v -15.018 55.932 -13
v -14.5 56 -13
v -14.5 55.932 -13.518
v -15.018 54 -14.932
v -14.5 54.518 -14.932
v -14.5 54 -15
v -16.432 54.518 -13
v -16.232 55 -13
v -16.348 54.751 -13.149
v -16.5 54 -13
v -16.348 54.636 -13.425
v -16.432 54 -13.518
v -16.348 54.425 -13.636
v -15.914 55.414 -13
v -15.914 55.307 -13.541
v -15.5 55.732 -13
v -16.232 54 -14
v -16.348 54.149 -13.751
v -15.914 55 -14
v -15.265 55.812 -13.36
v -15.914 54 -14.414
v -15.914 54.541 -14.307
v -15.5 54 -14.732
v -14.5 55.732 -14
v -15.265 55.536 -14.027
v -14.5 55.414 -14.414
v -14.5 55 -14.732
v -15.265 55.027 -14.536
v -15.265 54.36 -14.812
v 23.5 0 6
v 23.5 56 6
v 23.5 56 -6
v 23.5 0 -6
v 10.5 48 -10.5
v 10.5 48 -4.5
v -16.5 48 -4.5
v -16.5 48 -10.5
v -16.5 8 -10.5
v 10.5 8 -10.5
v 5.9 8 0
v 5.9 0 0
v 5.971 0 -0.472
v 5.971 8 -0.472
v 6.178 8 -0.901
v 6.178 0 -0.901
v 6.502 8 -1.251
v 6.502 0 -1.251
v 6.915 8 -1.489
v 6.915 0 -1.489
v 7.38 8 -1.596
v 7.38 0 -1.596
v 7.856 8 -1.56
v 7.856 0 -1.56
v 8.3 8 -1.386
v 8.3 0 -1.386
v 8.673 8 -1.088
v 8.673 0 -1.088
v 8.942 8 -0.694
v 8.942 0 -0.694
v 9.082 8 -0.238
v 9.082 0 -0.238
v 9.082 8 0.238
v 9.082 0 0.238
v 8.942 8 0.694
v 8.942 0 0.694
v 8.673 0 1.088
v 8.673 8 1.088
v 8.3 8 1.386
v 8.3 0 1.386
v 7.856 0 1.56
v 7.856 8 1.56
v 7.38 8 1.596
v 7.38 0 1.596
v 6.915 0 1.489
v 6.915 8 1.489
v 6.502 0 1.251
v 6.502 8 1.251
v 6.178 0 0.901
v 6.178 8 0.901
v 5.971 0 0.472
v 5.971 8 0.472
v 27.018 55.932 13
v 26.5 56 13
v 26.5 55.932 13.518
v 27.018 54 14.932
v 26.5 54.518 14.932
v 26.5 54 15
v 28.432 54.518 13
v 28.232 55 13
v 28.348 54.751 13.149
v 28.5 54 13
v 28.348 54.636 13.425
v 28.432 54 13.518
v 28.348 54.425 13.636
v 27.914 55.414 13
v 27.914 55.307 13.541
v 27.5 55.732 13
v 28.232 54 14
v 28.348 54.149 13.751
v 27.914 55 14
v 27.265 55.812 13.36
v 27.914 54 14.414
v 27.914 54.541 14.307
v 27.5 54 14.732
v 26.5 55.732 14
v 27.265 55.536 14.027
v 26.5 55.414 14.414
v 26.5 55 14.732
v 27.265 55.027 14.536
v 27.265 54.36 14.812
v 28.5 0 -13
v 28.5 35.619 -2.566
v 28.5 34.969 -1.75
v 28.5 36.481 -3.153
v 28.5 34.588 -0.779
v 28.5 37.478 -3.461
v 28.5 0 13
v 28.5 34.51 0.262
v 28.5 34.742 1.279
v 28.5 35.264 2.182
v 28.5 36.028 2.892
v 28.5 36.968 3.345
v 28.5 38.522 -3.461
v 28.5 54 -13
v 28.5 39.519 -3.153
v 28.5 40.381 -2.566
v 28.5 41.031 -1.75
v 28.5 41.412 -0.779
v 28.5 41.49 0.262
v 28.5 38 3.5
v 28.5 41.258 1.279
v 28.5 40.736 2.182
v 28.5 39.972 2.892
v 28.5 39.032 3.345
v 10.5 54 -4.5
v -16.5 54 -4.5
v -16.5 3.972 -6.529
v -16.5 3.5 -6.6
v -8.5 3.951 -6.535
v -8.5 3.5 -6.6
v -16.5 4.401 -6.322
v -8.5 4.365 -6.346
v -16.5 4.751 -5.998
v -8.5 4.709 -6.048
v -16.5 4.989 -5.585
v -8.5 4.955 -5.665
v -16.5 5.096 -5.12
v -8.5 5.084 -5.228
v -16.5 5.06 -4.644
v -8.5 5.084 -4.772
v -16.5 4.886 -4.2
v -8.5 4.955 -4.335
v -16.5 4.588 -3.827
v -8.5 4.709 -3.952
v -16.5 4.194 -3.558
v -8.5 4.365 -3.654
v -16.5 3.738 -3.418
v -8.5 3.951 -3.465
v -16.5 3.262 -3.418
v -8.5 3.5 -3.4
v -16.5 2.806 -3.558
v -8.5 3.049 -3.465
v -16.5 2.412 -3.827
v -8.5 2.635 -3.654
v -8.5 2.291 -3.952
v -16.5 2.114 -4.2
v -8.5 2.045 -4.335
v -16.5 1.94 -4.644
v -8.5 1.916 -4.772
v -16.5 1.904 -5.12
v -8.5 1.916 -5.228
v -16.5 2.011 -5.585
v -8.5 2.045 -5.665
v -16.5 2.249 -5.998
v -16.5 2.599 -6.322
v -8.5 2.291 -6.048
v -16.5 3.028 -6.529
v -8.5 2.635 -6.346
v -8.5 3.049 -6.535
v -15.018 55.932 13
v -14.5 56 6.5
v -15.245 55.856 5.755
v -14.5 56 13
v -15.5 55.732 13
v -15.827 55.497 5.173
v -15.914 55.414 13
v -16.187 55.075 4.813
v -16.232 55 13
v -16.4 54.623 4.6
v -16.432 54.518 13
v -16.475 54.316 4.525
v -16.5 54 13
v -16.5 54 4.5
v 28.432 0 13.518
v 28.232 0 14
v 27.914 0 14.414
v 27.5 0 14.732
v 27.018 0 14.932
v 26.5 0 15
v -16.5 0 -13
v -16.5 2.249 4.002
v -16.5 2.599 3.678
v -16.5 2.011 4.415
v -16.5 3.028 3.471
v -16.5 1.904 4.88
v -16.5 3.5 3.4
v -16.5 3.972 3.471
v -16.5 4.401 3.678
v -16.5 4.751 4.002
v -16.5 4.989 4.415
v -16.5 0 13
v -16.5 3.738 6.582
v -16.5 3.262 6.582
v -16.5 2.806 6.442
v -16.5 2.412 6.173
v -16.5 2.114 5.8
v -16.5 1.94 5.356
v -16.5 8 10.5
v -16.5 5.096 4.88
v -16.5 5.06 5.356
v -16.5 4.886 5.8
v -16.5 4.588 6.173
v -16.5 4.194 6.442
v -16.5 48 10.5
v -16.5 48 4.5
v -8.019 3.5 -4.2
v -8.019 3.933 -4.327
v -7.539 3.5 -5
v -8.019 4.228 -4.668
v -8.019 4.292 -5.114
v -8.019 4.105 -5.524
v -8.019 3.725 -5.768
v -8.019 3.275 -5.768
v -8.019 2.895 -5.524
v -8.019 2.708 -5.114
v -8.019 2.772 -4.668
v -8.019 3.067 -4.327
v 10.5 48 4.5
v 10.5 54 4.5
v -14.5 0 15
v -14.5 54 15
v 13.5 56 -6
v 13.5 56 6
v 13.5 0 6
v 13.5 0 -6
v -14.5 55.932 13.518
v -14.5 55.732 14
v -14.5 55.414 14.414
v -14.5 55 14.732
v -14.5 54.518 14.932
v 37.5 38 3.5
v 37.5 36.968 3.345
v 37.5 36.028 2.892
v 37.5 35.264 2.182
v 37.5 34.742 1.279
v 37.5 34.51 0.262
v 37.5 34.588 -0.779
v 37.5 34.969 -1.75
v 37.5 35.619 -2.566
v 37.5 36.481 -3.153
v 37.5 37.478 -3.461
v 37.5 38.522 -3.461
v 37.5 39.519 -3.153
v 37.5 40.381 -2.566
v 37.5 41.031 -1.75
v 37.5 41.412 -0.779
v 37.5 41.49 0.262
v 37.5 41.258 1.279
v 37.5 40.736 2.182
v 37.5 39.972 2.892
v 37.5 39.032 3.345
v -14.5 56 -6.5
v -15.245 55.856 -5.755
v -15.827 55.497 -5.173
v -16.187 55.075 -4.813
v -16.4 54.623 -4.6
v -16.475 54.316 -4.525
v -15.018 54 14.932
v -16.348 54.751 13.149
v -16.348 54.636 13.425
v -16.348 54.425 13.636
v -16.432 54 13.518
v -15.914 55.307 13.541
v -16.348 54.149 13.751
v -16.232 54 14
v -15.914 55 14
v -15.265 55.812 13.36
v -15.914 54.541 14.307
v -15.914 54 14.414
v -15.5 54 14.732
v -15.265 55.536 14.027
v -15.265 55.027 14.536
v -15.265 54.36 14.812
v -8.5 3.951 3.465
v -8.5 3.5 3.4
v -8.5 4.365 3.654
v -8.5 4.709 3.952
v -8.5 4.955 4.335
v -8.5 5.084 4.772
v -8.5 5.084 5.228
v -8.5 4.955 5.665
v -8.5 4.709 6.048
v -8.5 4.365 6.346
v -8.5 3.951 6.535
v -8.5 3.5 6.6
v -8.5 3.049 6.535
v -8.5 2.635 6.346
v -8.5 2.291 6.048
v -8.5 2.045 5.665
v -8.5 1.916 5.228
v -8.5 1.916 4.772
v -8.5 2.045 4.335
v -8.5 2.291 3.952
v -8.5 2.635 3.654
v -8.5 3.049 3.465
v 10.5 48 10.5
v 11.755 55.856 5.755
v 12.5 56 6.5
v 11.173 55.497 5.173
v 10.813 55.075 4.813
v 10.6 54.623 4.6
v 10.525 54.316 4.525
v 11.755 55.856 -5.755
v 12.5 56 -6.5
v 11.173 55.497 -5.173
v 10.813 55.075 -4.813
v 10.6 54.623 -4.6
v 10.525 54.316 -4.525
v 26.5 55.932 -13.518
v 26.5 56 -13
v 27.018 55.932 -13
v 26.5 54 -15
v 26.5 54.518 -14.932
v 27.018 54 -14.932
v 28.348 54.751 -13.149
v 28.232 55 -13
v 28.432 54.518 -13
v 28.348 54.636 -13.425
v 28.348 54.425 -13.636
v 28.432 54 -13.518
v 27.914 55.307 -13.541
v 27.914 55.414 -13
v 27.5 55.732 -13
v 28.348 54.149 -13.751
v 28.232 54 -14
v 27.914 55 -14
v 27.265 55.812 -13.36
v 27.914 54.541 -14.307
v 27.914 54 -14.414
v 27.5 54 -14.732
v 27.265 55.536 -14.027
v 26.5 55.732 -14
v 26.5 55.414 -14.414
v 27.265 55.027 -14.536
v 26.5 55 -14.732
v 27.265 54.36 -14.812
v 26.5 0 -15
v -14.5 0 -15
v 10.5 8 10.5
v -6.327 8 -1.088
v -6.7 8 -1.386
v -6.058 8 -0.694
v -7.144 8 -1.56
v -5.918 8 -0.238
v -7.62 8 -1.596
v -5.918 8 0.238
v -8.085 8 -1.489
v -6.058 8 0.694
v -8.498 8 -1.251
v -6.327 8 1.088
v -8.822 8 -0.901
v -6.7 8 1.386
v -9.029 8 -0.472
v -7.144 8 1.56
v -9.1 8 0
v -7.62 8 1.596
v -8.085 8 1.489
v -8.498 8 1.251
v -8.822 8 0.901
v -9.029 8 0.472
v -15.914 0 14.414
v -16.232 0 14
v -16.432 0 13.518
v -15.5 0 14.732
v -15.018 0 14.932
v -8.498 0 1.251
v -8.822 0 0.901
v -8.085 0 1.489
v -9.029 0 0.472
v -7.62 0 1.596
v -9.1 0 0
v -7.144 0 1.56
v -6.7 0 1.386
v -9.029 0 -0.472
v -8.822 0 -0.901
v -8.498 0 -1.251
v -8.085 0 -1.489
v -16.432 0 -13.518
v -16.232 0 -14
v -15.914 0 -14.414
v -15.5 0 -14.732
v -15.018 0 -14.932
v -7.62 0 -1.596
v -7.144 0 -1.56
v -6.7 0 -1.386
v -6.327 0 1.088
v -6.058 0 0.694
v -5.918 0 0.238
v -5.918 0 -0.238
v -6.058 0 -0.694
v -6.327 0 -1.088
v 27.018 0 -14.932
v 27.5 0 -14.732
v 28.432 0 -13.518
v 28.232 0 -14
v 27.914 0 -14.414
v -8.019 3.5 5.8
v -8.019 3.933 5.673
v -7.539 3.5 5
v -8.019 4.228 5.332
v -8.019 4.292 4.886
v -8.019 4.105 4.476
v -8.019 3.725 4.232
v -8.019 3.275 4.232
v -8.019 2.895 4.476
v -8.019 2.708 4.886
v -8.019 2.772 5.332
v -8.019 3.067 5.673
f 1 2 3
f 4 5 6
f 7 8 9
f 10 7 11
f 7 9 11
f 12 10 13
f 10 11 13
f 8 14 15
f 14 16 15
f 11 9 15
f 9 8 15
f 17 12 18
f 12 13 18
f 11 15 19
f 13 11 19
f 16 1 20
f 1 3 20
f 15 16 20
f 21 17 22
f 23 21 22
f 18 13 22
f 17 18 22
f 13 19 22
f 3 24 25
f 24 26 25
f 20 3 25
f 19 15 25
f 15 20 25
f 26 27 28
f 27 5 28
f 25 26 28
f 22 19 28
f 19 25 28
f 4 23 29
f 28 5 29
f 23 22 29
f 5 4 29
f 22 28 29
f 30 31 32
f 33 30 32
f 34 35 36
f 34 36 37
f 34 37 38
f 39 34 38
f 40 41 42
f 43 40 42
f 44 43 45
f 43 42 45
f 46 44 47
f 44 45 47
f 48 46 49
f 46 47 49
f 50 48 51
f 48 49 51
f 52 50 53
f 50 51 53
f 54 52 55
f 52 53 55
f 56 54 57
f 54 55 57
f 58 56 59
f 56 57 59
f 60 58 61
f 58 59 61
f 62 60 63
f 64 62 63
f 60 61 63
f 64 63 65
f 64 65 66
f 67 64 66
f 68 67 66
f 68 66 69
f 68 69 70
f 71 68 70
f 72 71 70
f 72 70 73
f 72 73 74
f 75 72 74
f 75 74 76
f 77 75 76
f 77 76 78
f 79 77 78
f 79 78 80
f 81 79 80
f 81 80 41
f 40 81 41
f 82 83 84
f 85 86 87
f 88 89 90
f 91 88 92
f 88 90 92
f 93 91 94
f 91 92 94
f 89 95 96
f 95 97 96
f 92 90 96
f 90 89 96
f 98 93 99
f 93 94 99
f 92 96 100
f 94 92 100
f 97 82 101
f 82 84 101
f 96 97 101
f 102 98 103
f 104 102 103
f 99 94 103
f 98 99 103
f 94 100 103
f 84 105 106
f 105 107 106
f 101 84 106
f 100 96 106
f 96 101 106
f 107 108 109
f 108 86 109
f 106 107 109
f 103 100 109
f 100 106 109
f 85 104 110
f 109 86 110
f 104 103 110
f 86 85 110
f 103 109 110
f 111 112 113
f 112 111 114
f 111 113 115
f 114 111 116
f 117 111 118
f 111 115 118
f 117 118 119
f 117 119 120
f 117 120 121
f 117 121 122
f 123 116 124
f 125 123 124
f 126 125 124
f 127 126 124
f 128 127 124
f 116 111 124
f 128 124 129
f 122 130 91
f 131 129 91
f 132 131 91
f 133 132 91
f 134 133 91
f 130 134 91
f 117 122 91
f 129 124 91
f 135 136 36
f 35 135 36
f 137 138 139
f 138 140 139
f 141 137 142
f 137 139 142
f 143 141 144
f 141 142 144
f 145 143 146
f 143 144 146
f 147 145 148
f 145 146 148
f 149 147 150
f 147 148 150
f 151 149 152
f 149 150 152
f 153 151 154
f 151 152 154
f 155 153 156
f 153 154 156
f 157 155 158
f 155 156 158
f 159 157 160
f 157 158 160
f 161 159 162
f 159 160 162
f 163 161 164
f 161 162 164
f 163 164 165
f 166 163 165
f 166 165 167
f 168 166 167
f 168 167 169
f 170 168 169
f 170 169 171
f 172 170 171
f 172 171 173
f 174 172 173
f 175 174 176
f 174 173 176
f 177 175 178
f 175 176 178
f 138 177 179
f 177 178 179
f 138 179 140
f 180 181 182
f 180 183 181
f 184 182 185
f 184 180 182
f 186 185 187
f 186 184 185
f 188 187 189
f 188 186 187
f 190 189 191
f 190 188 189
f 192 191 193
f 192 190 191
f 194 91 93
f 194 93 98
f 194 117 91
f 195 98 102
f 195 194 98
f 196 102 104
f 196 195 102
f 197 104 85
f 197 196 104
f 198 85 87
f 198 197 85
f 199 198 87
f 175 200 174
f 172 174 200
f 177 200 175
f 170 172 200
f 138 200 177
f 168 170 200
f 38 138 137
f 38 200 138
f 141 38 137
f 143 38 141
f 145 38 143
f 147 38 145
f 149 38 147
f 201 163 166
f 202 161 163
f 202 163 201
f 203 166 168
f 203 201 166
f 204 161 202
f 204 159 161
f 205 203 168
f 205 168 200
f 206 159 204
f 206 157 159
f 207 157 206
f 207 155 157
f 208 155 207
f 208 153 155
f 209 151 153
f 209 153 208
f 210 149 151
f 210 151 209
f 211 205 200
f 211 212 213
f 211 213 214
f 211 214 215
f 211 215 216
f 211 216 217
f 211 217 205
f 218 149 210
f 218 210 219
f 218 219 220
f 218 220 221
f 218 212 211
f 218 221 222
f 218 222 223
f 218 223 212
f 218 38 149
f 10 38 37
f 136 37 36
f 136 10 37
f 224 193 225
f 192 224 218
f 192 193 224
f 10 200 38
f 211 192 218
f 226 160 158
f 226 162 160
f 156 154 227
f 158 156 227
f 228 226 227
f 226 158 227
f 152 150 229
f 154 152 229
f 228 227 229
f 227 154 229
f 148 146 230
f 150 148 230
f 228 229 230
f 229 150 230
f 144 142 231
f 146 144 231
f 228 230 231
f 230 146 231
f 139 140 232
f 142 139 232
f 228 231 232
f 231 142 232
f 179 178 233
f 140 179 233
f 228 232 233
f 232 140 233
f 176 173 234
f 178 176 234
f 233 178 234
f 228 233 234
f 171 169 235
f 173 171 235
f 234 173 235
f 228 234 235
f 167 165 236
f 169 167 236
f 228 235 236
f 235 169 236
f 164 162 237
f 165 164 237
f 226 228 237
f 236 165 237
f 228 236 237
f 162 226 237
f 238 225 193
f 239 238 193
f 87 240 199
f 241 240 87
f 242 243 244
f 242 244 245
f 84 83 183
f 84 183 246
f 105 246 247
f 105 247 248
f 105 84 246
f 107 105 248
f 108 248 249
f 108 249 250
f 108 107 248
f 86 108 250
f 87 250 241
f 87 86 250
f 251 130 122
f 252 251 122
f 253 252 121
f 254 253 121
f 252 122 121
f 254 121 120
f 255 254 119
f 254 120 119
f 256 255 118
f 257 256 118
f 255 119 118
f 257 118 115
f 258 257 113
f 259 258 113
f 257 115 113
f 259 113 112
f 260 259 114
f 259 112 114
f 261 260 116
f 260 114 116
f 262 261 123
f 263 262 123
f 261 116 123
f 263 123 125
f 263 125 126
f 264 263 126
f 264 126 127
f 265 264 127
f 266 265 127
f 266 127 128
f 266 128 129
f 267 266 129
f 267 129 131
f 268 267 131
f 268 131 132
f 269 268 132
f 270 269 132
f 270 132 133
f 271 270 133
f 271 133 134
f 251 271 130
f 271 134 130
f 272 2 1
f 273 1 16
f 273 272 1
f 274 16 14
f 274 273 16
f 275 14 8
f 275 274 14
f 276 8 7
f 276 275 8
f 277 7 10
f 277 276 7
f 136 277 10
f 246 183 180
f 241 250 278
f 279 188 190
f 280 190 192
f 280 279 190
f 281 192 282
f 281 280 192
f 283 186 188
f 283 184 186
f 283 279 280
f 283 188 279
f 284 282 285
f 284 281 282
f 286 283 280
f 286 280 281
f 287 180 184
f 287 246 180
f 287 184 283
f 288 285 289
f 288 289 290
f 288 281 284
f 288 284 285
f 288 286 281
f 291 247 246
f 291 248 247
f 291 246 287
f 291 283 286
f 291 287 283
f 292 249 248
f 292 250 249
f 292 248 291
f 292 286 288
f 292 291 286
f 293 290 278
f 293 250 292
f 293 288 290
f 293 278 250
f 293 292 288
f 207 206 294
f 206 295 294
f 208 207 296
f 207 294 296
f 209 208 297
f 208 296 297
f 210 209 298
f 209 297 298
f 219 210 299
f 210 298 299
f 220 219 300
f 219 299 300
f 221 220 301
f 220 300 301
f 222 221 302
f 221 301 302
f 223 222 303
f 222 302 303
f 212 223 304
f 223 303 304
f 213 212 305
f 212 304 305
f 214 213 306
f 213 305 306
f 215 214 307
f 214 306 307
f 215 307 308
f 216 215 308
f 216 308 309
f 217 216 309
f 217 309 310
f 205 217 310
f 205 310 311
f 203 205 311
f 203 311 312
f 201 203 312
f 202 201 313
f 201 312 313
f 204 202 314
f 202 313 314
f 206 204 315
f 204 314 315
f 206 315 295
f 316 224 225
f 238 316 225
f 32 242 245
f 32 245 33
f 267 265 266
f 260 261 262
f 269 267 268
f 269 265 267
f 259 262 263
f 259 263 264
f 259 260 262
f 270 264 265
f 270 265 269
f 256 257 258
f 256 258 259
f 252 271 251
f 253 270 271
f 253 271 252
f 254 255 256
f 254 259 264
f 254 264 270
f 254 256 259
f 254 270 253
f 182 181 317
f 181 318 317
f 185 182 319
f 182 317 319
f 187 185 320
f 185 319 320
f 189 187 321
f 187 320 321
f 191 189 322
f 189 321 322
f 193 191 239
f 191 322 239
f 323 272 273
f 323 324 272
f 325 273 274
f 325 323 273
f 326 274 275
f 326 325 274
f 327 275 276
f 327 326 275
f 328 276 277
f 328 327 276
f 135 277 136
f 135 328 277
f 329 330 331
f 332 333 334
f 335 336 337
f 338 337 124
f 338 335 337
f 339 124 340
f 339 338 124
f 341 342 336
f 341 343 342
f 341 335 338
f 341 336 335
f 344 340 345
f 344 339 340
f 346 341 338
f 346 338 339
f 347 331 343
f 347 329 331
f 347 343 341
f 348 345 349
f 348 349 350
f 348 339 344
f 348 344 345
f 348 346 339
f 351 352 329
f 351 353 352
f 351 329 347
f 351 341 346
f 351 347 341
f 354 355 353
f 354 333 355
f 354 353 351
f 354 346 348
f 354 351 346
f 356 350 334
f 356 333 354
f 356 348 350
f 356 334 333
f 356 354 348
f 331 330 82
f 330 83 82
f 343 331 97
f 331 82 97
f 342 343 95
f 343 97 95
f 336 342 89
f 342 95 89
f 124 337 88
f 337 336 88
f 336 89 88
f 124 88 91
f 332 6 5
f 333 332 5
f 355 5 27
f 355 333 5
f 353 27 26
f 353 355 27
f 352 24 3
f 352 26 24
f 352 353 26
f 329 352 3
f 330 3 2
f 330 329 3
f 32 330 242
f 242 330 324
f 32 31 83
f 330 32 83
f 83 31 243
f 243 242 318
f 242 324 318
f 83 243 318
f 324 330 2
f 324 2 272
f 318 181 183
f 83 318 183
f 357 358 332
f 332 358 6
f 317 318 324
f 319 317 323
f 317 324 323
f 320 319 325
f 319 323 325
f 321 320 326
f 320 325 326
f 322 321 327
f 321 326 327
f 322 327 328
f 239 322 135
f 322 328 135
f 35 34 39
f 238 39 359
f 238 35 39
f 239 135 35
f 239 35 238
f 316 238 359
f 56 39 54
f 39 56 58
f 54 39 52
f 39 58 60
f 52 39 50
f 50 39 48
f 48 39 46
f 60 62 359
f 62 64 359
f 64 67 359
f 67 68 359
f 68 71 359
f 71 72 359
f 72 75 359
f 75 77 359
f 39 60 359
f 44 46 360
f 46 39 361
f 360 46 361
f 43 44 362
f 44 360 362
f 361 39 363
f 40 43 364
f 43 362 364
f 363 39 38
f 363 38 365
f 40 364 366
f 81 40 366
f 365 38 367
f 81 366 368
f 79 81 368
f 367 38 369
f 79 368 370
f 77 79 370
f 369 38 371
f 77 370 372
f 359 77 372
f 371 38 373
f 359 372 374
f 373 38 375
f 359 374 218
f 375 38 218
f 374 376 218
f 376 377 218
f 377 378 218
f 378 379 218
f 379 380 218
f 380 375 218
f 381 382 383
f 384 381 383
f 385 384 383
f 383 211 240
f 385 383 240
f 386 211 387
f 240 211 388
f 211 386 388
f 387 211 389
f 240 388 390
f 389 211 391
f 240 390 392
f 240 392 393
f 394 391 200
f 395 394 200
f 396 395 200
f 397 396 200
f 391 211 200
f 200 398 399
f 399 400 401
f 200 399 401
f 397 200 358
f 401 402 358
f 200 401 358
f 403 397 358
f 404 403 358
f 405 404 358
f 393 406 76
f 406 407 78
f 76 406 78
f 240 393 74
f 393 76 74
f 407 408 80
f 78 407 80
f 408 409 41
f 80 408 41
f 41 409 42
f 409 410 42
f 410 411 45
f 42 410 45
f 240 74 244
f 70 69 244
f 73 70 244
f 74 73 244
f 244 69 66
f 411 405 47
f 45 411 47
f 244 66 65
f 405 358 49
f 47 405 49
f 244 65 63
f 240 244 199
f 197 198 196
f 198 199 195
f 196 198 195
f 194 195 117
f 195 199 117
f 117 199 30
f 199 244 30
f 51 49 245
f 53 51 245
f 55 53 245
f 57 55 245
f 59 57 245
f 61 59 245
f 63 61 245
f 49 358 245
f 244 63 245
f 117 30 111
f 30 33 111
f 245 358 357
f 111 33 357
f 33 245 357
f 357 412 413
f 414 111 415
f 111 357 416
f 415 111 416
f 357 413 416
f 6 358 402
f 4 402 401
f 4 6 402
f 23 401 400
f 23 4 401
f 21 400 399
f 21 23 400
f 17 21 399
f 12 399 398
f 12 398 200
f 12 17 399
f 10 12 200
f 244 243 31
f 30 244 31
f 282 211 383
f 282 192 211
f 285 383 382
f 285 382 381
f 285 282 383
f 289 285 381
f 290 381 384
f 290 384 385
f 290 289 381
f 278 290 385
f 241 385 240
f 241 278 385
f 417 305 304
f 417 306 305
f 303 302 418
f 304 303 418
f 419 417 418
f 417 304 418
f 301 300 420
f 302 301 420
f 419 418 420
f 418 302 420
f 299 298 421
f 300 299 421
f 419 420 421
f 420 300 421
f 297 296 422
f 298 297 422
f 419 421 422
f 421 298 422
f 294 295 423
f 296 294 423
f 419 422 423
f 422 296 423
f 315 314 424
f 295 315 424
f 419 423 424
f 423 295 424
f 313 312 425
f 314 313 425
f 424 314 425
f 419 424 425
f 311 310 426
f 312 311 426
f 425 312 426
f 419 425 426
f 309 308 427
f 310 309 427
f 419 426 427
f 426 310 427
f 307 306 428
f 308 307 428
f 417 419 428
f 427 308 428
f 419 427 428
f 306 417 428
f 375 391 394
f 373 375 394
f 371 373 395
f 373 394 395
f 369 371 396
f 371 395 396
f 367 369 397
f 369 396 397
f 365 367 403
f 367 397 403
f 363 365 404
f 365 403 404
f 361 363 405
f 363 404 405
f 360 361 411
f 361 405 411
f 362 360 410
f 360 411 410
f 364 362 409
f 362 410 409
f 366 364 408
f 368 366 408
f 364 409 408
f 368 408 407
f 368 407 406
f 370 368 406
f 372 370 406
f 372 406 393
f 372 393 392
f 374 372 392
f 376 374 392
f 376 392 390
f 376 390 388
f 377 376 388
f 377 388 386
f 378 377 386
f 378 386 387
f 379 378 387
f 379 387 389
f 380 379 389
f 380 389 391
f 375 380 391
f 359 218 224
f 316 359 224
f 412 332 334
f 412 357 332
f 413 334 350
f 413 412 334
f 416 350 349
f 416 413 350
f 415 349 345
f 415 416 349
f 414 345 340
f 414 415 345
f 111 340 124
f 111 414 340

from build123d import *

# Parameters (mm, degrees)
ESQUISSE1_W             = 45
ESQUISSE1_H             = 30
BOSS_EXTRU_1_DEPTH      = 8
ESQUISSE5_W             = 30
ESQUISSE5_H             = 48
BOSS_EXTRU_3_DEPTH      = 45
ENL_V_MAT_EXTRU_1_DEPTH = 27
CONG_1_R                = 2
ESQUISSE16_R            = 3.5
BOSS_EXTRU_5_DEPTH      = 9
D_GAGEMENT_M32_D        = 3.2
D_GAGEMENT_M33_D        = 3.2
D_GAGEMENT_M33_DEPTH    = 8
D_GAGEMENT_M33_TIP      = 0.96137699
ESQUISSE28_W            = 10
ESQUISSE28_H            = 12
ENL_V_MAT_EXTRU_2_DEPTH = 70.045275001


with BuildPart() as part:
    # Esquisse1 → Boss.-Extru.1 (new body)
    with BuildSketch(Plane(origin=(0, 0, 0), x_dir=(1, 0, 0), z_dir=(0, 1, 0))):
        with Locations((6, 0)):
            Rectangle(ESQUISSE1_W, ESQUISSE1_H)
    extrude(amount=BOSS_EXTRU_1_DEPTH)

    # Esquisse5 → Boss.-Extru.3 (add)
    with BuildSketch(Plane.ZY.offset(16.5)):
        with Locations((0, 32)):
            Rectangle(ESQUISSE5_W, ESQUISSE5_H)
    extrude(amount=-BOSS_EXTRU_3_DEPTH)

    # Esquisse6 → Enlèv. mat.-Extru.1 (cut)
    with BuildSketch(Plane.ZY.offset(16.5)):
        Polygon((10.5, 48), (4.5, 48), (4.5, 56), (-4.5, 56), (-4.5, 48), (-10.5, 48), (-10.5, 8), (10.5, 8), align=None)
    extrude(amount=-ENL_V_MAT_EXTRU_1_DEPTH, mode=Mode.SUBTRACT)

    # Congé1
    cong_1_edges = [part.edges().sort_by_distance(p)[0] for p in [
        (6, 56, -15),
        (6, 56, 15),
        (-16.5, 56, 9.75),
        (28.5, 56, 0),
        (-16.5, 56, -9.75),
        (10.5, 56, 0),
        (-3, 56, -4.5),
        (-3, 56, 4.5),
        (28.5, 28, 15),
        (-16.5, 28, 15),
        (-16.5, 28, -15),
        (28.5, 28, -15),
    ]]
    fillet(cong_1_edges, radius=CONG_1_R)

    # Esquisse16 → Boss.-Extru.5 (add)
    with BuildSketch(Plane(origin=(28.5, 0, 0), x_dir=(0, 0, -1), z_dir=(1, 0, 0))):
        with Locations(Location((0, 38, 0), (0, 0, 180))):
            Circle(ESQUISSE16_R)
    extrude(amount=BOSS_EXTRU_5_DEPTH)

    # Dégagement M32 (through all)
    with Locations(Plane(origin=(0, 8, 0), x_dir=(1, 0, 0), z_dir=(0, 1, 0))):
        with Locations((-7.5, 0), (7.5, 0)):
            Hole(D_GAGEMENT_M32_D / 2)

    # Dégagement M33
    with Locations(Plane.ZY.offset(16.5)):
        with Locations((-5, 3.5), (5, 3.5)):
            Hole(D_GAGEMENT_M33_D / 2, depth=D_GAGEMENT_M33_DEPTH)
            with Locations((0, 0, -(D_GAGEMENT_M33_DEPTH + D_GAGEMENT_M33_TIP / 2))):  # 118° drill point
                Cone(0, D_GAGEMENT_M33_D / 2, D_GAGEMENT_M33_TIP, mode=Mode.SUBTRACT)

    # Esquisse28 → Enlèv. mat.-Extru.2 (cut, through all)
    with BuildSketch(Plane(origin=(0, 56, 0), x_dir=(1, 0, 0), z_dir=(0, 1, 0))):
        with Locations((18.5, 0)):
            Rectangle(ESQUISSE28_W, ESQUISSE28_H)
    extrude(amount=-ENL_V_MAT_EXTRU_2_DEPTH, mode=Mode.SUBTRACT)


solid = part.part
